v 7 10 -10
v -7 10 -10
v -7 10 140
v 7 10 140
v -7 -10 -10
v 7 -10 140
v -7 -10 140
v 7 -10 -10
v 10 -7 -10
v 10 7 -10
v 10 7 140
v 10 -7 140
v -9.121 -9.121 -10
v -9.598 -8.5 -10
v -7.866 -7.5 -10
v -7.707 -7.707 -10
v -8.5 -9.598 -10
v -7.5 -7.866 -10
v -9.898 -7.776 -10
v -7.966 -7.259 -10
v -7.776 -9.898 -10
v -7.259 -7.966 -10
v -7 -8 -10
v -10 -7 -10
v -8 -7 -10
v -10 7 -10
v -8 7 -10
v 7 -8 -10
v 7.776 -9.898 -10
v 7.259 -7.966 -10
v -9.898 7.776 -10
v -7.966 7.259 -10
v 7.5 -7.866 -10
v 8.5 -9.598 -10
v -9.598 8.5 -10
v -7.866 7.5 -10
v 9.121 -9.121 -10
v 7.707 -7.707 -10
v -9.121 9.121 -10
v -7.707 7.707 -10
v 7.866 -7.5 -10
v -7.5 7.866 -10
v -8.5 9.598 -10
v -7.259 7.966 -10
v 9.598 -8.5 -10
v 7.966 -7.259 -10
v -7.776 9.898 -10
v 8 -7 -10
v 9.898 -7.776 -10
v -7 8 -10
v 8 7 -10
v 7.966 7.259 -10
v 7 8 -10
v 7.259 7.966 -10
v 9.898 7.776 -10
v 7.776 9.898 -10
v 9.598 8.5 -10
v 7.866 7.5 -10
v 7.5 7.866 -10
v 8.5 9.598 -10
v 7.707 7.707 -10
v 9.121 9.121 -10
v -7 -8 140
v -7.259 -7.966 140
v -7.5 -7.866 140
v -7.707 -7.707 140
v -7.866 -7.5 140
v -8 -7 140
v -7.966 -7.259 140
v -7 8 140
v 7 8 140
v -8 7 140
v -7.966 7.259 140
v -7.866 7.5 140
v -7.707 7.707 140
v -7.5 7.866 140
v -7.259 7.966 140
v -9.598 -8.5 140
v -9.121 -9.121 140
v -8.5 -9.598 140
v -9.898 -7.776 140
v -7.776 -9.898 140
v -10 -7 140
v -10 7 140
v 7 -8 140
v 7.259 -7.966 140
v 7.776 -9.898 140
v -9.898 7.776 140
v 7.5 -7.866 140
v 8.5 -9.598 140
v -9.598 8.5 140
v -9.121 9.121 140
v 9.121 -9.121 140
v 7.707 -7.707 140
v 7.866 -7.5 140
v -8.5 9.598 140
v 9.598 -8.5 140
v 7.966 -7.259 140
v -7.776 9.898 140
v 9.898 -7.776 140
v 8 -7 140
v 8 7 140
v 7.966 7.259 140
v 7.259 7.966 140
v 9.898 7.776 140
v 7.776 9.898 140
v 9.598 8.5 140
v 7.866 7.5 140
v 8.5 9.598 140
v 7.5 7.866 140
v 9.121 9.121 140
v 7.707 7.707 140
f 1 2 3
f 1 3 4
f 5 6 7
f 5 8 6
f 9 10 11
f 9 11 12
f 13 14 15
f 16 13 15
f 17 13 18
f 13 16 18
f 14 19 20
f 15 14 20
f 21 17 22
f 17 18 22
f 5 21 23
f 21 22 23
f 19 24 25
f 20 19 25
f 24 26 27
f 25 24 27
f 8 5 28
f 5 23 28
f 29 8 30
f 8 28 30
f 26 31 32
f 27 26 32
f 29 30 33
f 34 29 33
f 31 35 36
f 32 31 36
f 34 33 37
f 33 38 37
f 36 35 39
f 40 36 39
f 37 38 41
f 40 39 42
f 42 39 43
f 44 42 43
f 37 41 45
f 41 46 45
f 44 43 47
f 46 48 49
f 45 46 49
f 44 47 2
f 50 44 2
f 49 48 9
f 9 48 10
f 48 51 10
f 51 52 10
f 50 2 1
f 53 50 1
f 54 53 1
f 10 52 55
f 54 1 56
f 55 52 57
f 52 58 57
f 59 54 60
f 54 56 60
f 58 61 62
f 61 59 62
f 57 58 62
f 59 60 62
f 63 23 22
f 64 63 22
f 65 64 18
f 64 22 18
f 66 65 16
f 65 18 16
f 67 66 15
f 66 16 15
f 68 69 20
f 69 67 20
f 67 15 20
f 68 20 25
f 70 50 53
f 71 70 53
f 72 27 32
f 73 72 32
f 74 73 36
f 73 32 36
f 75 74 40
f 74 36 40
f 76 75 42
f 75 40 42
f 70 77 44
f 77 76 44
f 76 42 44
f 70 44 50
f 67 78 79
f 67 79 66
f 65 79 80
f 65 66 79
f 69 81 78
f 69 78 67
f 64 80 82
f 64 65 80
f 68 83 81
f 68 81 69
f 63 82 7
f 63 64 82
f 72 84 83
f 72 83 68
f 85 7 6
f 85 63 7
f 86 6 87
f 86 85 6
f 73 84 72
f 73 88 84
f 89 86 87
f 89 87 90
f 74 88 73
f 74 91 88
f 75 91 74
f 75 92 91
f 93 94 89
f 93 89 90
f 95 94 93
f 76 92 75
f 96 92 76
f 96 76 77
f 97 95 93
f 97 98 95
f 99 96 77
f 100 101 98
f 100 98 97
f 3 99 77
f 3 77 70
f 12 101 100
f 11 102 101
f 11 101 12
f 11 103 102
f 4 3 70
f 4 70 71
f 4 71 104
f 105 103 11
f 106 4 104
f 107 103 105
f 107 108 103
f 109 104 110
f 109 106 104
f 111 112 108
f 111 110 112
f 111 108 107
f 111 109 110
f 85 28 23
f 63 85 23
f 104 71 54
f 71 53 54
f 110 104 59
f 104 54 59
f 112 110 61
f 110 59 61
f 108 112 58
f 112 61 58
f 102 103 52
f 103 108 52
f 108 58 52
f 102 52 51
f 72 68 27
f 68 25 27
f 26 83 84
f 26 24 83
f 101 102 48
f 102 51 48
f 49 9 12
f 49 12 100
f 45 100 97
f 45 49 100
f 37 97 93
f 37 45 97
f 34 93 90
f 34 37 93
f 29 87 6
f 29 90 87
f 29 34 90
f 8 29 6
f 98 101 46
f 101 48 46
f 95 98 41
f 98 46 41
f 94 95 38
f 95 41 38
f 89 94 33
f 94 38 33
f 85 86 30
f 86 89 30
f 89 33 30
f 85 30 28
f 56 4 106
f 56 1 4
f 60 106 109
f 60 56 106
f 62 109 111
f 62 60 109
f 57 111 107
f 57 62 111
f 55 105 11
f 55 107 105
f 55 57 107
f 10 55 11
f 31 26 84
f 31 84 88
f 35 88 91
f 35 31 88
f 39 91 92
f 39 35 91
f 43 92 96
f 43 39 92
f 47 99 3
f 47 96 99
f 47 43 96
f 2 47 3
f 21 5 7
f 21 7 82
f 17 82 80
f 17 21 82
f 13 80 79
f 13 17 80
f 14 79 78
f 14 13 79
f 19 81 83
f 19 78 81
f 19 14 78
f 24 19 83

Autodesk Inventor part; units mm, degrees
ref_plane "Start Plane" through (0, 0, -10) normal (0, 0, 1) x (1, 0, 0)
ref_plane "End Plane" through (0, 0, 140) normal (0, 0, 1) x (1, 0, 0)
sketch "Sketch" plane through (0, 0, 0) normal (0, 0, 1) x (1, 0, 0)
  line L0 (-10, -7) -> (-10, 7)
  line L1 (-7, 10) -> (7, 10)
  line L2 (10, 7) -> (10, -7)
  line L3 (7, -10) -> (-7, -10)
  arc A0 (-10, -7) -> (-7, -10) centre (-7, -7) ccw
  arc A1 (-7, 10) -> (-10, 7) centre (-7, 7) ccw
  arc A2 (10, 7) -> (7, 10) centre (7, 7) ccw
  arc A3 (7, -10) -> (10, -7) centre (7, -7) ccw
  arc A4 (-7, 8) -> (-8, 7) centre (-7, 7) ccw
  line L4 (-7, 8) -> (7, 8)
  arc A5 (8, 7) -> (7, 8) centre (7, 7) ccw
  line L5 (8, 7) -> (8, -7)
  arc A6 (7, -8) -> (8, -7) centre (7, -7) ccw
  line L6 (7, -8) -> (-7, -8)
  arc A7 (-8, -7) -> (-7, -8) centre (-7, -7) ccw
  line L7 (-8, -7) -> (-8, 7)
  line L8 (0, 14.8698) -> (0, -14.8698) construction
  line L9 (-14.8698, 0) -> (14.8698, 0) construction
  dimension "d7" = 3
  dimension "d10" = 20
  dimension "d11" = 20
  dimension "d12" = 2
  dimension "d15" = 10
  dimension "d16" = 10
extrude "Body" add sketch "Sketch" along normal up to surface (150 mm away) from surface at -10
sketch "Sketch3" plane through (0, 0, 0) normal (0, 0, 1) x (1, 0, 0)
  line L0 (0, 0) -> (10, 0)
ref_plane "Work Plane3" through (0, 0, 0) normal (0, -1, 0) x (1, 0, 0)
sketch "Sketch4" plane through (0, 0, 0) normal (0, -1, 0) x (1, 0, 0)
  line L0 (-2, -10) -> (12, -10)
  line L1 (-2, 140) -> (12, 140)
  dimension "d18" = 150
ref_plane "Work Plane4" through (0, 0, -10) normal (0, 0, -1) x (-1, 0, 0)
split "Split1" plane through (0, 0, -10) removes the side toward (0, 0, -1)
ref_plane "Work Plane5" through (-7, -210, 140) normal (0, 0, 1) x (1, 0, 0)
split "Split2" plane through (-7, -210, 140) removes the side toward (0, 0, 1)
equation "\"d7\" = G_IR"
equation "\"d10\" = G_H"
equation "\"d11\" = G_W"
equation "\"d12\" = G_T"
equation "\"d15\" = 0.5 * d10"
equation "\"d16\" = 0.5 * d11"
equation "\"d3\" = G_L"
equation "\"G_W\" = 20"
equation "\"G_H\" = 20"
equation "\"G_T\" = 2"
equation "\"G_IR\" = 3"
equation "\"G_L\" = d18"
properties part number "ISO 12633-2 - 20x20x2 - 150" material "Steel, Mild"
